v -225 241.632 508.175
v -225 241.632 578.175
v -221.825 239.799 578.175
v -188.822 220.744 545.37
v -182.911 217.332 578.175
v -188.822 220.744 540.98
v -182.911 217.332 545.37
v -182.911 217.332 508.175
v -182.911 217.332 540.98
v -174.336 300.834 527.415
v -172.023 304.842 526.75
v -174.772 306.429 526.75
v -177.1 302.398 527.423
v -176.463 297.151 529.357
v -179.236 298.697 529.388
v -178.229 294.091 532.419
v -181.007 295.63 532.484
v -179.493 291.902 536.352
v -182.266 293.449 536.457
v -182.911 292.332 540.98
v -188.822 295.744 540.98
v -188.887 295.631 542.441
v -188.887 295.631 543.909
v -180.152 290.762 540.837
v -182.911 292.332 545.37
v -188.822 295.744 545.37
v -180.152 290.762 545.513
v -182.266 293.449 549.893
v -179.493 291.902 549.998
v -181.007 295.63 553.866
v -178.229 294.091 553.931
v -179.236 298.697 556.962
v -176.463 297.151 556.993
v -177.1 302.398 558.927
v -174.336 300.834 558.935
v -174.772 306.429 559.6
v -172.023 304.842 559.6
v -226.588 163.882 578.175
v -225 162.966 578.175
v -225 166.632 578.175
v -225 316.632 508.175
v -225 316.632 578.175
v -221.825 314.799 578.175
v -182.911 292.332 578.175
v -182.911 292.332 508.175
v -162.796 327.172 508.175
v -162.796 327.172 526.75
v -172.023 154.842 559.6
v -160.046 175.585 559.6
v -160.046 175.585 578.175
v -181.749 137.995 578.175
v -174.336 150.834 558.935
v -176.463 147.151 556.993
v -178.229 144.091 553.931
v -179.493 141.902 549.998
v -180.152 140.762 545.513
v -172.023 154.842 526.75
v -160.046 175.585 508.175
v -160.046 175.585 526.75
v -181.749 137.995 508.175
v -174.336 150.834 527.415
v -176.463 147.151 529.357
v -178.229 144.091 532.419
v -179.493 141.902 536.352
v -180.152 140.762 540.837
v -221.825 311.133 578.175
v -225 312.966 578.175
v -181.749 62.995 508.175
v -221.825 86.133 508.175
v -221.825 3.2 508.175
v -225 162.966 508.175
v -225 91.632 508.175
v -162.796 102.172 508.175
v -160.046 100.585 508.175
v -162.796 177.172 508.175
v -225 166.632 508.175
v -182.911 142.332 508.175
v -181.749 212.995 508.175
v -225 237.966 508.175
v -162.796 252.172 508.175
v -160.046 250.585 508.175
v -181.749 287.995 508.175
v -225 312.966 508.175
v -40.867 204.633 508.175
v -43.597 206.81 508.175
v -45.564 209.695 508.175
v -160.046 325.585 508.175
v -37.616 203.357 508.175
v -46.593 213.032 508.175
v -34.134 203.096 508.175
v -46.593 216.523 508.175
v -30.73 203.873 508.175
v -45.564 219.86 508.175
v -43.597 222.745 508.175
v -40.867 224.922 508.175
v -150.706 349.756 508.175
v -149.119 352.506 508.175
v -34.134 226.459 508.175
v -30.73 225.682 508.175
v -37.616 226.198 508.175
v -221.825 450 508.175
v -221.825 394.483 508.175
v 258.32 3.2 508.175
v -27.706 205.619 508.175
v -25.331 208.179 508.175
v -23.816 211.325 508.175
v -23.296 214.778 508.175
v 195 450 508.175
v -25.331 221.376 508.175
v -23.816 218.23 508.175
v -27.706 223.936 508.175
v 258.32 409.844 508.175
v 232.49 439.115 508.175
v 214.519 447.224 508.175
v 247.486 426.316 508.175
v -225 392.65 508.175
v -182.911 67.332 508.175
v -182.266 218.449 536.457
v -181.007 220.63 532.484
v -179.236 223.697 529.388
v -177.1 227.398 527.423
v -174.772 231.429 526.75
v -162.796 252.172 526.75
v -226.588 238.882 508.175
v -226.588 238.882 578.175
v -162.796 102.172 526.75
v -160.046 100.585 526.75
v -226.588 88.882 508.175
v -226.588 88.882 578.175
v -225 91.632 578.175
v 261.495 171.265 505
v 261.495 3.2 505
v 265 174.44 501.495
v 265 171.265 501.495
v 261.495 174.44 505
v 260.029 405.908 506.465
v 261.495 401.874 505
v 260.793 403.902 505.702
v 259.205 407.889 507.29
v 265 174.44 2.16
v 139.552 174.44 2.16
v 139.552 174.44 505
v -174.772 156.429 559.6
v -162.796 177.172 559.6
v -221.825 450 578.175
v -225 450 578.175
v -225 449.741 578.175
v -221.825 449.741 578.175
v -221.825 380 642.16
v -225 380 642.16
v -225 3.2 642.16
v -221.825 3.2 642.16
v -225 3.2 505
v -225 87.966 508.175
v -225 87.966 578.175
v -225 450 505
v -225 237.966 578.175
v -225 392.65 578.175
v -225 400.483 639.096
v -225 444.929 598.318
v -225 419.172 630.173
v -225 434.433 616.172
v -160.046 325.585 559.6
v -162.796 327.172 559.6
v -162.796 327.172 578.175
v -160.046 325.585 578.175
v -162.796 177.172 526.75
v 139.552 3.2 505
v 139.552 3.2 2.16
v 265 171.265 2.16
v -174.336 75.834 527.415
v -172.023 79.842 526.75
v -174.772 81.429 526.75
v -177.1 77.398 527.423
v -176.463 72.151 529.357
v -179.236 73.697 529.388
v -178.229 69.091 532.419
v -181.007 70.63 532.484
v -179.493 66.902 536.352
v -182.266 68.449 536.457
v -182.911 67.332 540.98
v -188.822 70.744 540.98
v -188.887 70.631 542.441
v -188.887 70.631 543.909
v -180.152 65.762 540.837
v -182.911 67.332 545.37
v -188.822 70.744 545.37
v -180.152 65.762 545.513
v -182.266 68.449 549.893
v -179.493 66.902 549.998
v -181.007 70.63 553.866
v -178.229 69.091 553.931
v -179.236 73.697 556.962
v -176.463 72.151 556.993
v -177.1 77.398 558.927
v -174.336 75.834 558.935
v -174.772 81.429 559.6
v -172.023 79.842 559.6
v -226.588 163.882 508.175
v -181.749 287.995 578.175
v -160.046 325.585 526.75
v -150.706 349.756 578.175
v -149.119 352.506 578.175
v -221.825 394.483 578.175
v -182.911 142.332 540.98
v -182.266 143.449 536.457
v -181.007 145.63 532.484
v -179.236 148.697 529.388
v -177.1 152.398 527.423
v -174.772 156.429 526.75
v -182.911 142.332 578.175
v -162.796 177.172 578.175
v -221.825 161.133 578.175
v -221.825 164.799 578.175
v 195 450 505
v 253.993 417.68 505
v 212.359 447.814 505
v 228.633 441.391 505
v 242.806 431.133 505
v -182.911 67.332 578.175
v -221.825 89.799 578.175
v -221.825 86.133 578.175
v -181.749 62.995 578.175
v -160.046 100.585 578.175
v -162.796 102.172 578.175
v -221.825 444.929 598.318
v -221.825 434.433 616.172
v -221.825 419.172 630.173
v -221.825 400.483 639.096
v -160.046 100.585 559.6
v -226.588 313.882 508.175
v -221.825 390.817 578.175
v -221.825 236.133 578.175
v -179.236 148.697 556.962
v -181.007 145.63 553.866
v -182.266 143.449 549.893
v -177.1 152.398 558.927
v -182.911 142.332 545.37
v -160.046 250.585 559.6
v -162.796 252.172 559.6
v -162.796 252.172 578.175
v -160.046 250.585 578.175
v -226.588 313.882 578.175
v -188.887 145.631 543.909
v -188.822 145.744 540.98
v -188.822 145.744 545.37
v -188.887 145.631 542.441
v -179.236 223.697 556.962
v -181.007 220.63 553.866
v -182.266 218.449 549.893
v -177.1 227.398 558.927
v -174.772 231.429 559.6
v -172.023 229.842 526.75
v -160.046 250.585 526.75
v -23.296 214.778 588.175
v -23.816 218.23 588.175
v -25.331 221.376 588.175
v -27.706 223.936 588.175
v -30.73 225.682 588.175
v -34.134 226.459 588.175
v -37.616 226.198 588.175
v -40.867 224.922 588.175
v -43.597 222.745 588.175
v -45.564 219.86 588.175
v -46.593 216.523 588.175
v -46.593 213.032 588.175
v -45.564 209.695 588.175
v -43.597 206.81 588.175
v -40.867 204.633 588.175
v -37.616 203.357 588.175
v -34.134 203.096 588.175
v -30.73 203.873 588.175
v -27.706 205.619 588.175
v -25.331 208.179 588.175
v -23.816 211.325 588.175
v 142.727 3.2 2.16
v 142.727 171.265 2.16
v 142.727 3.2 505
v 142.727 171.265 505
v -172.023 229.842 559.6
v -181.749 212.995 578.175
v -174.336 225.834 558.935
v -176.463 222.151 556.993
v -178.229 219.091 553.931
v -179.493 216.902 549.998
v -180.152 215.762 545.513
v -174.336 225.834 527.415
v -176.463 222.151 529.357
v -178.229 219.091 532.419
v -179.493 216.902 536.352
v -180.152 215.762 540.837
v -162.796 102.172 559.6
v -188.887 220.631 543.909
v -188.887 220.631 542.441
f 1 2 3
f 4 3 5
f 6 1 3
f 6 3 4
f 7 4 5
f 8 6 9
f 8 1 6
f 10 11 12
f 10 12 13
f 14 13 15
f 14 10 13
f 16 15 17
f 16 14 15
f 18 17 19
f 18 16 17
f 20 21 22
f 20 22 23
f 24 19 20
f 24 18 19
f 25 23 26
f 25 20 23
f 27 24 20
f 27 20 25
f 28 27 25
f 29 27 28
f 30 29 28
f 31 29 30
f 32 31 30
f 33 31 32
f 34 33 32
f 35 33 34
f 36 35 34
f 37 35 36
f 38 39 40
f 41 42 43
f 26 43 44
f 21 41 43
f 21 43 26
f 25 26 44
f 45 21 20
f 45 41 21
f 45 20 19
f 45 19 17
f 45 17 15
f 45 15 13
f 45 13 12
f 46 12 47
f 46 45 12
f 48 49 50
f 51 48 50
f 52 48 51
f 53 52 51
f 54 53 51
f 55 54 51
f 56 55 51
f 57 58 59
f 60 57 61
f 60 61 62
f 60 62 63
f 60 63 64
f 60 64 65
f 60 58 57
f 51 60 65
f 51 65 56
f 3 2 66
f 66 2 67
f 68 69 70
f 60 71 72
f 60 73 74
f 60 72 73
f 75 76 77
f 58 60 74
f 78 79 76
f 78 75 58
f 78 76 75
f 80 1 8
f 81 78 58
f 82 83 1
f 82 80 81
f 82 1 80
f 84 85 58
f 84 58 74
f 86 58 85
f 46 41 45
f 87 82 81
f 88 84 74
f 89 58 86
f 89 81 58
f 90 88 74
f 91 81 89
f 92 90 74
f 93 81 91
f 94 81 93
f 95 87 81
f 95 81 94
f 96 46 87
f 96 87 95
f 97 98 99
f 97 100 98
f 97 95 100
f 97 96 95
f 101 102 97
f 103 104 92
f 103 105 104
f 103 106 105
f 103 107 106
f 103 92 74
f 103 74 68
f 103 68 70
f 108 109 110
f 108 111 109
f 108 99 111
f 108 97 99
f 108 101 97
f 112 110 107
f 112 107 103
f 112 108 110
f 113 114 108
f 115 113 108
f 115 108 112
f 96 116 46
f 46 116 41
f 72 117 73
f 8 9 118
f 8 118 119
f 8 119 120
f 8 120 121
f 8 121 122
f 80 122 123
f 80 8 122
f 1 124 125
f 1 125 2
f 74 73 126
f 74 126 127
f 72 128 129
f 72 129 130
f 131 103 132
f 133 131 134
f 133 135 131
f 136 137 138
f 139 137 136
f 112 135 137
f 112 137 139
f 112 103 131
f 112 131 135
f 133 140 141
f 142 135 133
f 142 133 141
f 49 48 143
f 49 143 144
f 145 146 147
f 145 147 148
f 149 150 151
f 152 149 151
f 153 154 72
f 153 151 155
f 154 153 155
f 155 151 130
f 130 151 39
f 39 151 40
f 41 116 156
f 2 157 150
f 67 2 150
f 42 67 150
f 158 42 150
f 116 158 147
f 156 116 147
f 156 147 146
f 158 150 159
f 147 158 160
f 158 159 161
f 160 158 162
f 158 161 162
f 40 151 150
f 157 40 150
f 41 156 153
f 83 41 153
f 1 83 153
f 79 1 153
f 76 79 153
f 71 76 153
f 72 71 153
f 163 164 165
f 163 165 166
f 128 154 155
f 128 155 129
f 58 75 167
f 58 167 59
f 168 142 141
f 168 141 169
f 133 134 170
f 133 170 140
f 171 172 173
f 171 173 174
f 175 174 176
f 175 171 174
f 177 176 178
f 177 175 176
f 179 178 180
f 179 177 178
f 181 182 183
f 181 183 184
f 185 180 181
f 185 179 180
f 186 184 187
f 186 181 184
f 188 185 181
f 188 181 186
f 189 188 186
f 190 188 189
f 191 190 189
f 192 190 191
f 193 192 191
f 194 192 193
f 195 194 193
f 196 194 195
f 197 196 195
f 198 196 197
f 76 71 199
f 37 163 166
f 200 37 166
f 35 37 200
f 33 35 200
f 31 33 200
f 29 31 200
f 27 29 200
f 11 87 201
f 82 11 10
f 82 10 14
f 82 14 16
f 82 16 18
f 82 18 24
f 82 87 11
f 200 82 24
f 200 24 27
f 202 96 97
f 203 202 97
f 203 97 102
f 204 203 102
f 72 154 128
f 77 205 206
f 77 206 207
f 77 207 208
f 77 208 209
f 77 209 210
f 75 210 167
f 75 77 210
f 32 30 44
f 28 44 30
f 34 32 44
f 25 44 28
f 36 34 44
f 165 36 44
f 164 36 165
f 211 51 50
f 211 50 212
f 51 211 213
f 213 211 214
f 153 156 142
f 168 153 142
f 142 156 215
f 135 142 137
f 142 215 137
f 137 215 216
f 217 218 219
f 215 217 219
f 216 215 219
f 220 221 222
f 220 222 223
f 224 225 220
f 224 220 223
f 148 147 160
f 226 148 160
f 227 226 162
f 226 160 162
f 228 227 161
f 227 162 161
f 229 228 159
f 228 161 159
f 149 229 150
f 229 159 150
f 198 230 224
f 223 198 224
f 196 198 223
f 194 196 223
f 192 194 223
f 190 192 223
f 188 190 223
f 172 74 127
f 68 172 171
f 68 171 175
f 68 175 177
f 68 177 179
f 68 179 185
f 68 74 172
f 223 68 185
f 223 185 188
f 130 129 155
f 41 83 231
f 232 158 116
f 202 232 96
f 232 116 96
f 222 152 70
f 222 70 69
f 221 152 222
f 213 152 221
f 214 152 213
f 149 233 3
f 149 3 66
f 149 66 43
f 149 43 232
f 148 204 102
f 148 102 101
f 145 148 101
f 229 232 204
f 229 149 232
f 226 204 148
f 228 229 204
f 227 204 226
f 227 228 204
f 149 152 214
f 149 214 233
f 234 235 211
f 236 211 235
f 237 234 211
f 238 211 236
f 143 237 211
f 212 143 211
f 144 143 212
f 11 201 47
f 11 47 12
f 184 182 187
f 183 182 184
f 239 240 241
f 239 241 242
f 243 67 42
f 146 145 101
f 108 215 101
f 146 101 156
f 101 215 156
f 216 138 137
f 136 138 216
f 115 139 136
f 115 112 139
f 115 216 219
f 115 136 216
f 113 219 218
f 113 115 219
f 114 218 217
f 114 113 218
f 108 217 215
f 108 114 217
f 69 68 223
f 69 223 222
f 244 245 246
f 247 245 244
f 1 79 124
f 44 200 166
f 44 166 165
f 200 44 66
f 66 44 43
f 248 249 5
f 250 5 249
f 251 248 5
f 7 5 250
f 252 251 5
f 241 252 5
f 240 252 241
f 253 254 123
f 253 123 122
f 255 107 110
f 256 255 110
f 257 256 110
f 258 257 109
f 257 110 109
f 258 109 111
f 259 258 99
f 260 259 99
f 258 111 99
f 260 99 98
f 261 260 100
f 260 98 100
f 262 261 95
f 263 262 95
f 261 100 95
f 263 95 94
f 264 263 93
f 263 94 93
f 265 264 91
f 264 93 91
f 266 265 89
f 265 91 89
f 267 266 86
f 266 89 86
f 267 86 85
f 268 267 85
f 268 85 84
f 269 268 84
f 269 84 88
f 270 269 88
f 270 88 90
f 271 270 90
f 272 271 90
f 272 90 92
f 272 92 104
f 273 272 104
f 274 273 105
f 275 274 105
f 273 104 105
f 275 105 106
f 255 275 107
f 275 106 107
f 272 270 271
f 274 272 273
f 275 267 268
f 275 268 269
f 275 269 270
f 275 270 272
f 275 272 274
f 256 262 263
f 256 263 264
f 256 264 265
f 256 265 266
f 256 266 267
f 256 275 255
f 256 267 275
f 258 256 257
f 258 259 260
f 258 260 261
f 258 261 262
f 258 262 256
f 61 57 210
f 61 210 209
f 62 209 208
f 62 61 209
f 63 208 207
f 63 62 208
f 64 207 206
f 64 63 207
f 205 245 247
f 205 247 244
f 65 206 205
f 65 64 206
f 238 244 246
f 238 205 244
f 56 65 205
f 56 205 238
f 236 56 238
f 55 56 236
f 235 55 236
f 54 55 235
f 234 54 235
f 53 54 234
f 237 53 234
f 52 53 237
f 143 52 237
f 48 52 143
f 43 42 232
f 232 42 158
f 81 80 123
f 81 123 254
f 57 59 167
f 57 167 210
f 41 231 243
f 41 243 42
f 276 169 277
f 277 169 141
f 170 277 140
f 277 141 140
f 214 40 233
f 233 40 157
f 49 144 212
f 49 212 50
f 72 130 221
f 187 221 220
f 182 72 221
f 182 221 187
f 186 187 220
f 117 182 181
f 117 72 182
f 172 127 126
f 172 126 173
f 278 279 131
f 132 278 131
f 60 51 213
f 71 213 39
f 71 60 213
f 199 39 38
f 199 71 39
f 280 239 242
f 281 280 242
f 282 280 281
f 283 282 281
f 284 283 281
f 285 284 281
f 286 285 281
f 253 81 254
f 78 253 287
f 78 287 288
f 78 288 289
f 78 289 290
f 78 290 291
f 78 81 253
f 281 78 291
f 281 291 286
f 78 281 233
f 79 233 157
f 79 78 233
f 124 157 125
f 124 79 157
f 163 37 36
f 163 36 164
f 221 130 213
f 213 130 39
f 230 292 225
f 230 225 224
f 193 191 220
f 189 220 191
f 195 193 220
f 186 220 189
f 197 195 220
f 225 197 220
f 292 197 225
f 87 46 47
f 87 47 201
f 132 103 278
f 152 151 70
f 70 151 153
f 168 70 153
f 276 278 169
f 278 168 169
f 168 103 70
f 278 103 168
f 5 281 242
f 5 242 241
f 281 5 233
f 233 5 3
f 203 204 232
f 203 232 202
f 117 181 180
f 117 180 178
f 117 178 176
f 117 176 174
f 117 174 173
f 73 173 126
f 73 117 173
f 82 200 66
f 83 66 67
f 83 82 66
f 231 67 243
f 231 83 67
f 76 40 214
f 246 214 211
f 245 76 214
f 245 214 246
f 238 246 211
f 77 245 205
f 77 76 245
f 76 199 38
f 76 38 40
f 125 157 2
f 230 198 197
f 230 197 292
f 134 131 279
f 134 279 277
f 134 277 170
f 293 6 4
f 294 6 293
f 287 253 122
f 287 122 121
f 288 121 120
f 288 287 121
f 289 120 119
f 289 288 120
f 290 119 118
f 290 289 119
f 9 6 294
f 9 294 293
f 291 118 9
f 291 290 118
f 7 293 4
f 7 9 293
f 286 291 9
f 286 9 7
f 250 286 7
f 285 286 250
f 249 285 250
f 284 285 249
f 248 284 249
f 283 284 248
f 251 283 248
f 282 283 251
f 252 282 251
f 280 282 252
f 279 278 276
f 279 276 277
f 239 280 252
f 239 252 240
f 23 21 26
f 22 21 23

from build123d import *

# Parameters (mm, degrees)
BOSS_EXTRUDE1_START   = 505
SKETCH1_W             = 490
SKETCH1_H             = 446.8
BOSS_EXTRUDE1_DEPTH   = 3.175
FILLET1_R             = 70
EXTRUDE_THIN1_DEPTH   = 70
CUT_EXTRUDE1_DEPTH    = 10
LPATTERN1_COUNT       = 4
LPATTERN1_PITCH       = 75
SKETCH4_R             = 11.713829312
BOSS_EXTRUDE2_DEPTH   = 80
EXTRUDE_THIN3_DEPTH   = 70
EXTRUDE_THIN4_START   = -225
EXTRUDE_THIN4_DEPTH   = 3.175
EXTRUDE_THIN5_DEPTH   = 502.84
SURFACECUT4_START     = 541.993470427
SURFACECUT4_OUTLINE_W = 12
SURFACECUT4_OUTLINE_H = 409
SURFACECUT4_DEPTH     = 4.723815117


# Read off the part's stored shape, not the designer's step: Extrude-Thin3, Extrude-Thin4, SurfaceCut4
with BuildPart() as part:
    # Sketch1 → Boss-Extrude1 (new body)
    with BuildSketch(Plane.XY.offset(BOSS_EXTRUDE1_START)):
        with Locations((20, 226.6)):
            Rectangle(SKETCH1_W, SKETCH1_H)
    extrude(amount=BOSS_EXTRUDE1_DEPTH)

    # Fillet1
    fillet1_edges = [part.edges().sort_by_distance(p)[0] for p in [
        (265, 450, 506.5875),
    ]]
    fillet(fillet1_edges, radius=FILLET1_R)

    # Sketch2 → Extrude-Thin1 (add)
    with BuildSketch(Plane.XY.offset(508.175)):
        Polygon((-225, 316.632001972), (-182.911143749, 292.331989485), (-162.795993223, 327.172452198), (-160.046362566, 325.584952198), (-181.749013092, 287.994858828), (-226.5875, 313.882371315), align=None)
    extrude_thin1 = extrude(amount=EXTRUDE_THIN1_DEPTH)

    # Sketch3 → Cut-Extrude1 (cut)
    with BuildSketch(Plane(origin=(-261.017191771, 150.698345932, 0), x_dir=(0, 0, -1), z_dir=(0.86602540378444, -0.49999999999999756, 0))):
        with BuildLine():
            Line((-526.749692135, 201.941658411), (-526.749692135, 177.989368438))
            ThreePointArc((-526.749692135, 177.989368438), (-543.175, 161.564060573), (-559.600307865, 177.989368438))
            Line((-559.600307865, 177.989368438), (-559.600307865, 201.941658411))
            ThreePointArc((-559.600307865, 201.941658411), (-543.175, 218.366966275), (-526.749692135, 201.941658411))
        make_face()
    cut_extrude1 = extrude(amount=-CUT_EXTRUDE1_DEPTH, mode=Mode.SUBTRACT)

    # LPattern1: Extrude-Thin1, Cut-Extrude1 ×4
    with Locations(*[(0, -i * LPATTERN1_PITCH, 0) for i in range(1, LPATTERN1_COUNT)]):
        add(extrude_thin1)
        add(cut_extrude1, mode=Mode.SUBTRACT)

    # Sketch4 → Boss-Extrude2 (add)
    with BuildSketch(Plane.XY.offset(508.175)):
        with Locations((-35.00971575, 214.777573056)):
            Circle(SKETCH4_R)
    extrude(amount=BOSS_EXTRUDE2_DEPTH)

    # Extrude-Thin3 outline → Extrude-Thin3 (add)
    with BuildSketch(Plane.XY.offset(508.175)):
        Polygon((-225, 450), (-225, 392.649743917), (-150.706309563, 349.756261744), (-149.118809563, 352.505892401), (-221.825, 394.482831022), (-221.825, 450), align=None)
        Polygon((-225, 87.965827762), (-225, 3.2), (-221.825, 3.2), (-221.825, 86.132740658), align=None)
    extrude(amount=EXTRUDE_THIN3_DEPTH)

    # Extrude-Thin4 outline → Extrude-Thin4 (add)
    with BuildSketch(Plane.YZ.offset(EXTRUDE_THIN4_START)):
        with BuildLine():
            Line((3.2, 578.175), (449.741091008, 578.175))
            ThreePointArc((449.741091008, 578.175), (427.323091613, 623.740277235), (380, 642.159999995))
            Line((380, 642.159999995), (3.2, 642.159999995))
            Line((3.2, 642.159999995), (3.2, 578.175))
        make_face()
    extrude(amount=EXTRUDE_THIN4_DEPTH)

    # Sketch8 → Extrude-Thin5 (add)
    with BuildSketch(Plane(origin=(0, 0, 505), x_dir=(-1, 0, 0), z_dir=(0, 0, -1))):
        Polygon((-142.726543885, 3.2), (-142.726543885, 171.264978509), (-265, 171.264978509), (-265, 174.439978509), (-139.551543885, 174.439978509), (-139.551543885, 3.2), align=None)
    extrude(amount=EXTRUDE_THIN5_DEPTH)

    # SurfaceCut4 outline → SurfaceCut4 (cut)
    with BuildSketch(Plane(origin=(0, 0, 0), x_dir=(0.707106781186548, 0, -0.707106781186547), z_dir=(0.707106781186547, 0, 0.707106781186548)).offset(SURFACECUT4_START)):
        with Locations((-172, 206.5)):
            Rectangle(SURFACECUT4_OUTLINE_W, SURFACECUT4_OUTLINE_H)
    extrude(amount=SURFACECUT4_DEPTH, mode=Mode.SUBTRACT)


solid = part.part
